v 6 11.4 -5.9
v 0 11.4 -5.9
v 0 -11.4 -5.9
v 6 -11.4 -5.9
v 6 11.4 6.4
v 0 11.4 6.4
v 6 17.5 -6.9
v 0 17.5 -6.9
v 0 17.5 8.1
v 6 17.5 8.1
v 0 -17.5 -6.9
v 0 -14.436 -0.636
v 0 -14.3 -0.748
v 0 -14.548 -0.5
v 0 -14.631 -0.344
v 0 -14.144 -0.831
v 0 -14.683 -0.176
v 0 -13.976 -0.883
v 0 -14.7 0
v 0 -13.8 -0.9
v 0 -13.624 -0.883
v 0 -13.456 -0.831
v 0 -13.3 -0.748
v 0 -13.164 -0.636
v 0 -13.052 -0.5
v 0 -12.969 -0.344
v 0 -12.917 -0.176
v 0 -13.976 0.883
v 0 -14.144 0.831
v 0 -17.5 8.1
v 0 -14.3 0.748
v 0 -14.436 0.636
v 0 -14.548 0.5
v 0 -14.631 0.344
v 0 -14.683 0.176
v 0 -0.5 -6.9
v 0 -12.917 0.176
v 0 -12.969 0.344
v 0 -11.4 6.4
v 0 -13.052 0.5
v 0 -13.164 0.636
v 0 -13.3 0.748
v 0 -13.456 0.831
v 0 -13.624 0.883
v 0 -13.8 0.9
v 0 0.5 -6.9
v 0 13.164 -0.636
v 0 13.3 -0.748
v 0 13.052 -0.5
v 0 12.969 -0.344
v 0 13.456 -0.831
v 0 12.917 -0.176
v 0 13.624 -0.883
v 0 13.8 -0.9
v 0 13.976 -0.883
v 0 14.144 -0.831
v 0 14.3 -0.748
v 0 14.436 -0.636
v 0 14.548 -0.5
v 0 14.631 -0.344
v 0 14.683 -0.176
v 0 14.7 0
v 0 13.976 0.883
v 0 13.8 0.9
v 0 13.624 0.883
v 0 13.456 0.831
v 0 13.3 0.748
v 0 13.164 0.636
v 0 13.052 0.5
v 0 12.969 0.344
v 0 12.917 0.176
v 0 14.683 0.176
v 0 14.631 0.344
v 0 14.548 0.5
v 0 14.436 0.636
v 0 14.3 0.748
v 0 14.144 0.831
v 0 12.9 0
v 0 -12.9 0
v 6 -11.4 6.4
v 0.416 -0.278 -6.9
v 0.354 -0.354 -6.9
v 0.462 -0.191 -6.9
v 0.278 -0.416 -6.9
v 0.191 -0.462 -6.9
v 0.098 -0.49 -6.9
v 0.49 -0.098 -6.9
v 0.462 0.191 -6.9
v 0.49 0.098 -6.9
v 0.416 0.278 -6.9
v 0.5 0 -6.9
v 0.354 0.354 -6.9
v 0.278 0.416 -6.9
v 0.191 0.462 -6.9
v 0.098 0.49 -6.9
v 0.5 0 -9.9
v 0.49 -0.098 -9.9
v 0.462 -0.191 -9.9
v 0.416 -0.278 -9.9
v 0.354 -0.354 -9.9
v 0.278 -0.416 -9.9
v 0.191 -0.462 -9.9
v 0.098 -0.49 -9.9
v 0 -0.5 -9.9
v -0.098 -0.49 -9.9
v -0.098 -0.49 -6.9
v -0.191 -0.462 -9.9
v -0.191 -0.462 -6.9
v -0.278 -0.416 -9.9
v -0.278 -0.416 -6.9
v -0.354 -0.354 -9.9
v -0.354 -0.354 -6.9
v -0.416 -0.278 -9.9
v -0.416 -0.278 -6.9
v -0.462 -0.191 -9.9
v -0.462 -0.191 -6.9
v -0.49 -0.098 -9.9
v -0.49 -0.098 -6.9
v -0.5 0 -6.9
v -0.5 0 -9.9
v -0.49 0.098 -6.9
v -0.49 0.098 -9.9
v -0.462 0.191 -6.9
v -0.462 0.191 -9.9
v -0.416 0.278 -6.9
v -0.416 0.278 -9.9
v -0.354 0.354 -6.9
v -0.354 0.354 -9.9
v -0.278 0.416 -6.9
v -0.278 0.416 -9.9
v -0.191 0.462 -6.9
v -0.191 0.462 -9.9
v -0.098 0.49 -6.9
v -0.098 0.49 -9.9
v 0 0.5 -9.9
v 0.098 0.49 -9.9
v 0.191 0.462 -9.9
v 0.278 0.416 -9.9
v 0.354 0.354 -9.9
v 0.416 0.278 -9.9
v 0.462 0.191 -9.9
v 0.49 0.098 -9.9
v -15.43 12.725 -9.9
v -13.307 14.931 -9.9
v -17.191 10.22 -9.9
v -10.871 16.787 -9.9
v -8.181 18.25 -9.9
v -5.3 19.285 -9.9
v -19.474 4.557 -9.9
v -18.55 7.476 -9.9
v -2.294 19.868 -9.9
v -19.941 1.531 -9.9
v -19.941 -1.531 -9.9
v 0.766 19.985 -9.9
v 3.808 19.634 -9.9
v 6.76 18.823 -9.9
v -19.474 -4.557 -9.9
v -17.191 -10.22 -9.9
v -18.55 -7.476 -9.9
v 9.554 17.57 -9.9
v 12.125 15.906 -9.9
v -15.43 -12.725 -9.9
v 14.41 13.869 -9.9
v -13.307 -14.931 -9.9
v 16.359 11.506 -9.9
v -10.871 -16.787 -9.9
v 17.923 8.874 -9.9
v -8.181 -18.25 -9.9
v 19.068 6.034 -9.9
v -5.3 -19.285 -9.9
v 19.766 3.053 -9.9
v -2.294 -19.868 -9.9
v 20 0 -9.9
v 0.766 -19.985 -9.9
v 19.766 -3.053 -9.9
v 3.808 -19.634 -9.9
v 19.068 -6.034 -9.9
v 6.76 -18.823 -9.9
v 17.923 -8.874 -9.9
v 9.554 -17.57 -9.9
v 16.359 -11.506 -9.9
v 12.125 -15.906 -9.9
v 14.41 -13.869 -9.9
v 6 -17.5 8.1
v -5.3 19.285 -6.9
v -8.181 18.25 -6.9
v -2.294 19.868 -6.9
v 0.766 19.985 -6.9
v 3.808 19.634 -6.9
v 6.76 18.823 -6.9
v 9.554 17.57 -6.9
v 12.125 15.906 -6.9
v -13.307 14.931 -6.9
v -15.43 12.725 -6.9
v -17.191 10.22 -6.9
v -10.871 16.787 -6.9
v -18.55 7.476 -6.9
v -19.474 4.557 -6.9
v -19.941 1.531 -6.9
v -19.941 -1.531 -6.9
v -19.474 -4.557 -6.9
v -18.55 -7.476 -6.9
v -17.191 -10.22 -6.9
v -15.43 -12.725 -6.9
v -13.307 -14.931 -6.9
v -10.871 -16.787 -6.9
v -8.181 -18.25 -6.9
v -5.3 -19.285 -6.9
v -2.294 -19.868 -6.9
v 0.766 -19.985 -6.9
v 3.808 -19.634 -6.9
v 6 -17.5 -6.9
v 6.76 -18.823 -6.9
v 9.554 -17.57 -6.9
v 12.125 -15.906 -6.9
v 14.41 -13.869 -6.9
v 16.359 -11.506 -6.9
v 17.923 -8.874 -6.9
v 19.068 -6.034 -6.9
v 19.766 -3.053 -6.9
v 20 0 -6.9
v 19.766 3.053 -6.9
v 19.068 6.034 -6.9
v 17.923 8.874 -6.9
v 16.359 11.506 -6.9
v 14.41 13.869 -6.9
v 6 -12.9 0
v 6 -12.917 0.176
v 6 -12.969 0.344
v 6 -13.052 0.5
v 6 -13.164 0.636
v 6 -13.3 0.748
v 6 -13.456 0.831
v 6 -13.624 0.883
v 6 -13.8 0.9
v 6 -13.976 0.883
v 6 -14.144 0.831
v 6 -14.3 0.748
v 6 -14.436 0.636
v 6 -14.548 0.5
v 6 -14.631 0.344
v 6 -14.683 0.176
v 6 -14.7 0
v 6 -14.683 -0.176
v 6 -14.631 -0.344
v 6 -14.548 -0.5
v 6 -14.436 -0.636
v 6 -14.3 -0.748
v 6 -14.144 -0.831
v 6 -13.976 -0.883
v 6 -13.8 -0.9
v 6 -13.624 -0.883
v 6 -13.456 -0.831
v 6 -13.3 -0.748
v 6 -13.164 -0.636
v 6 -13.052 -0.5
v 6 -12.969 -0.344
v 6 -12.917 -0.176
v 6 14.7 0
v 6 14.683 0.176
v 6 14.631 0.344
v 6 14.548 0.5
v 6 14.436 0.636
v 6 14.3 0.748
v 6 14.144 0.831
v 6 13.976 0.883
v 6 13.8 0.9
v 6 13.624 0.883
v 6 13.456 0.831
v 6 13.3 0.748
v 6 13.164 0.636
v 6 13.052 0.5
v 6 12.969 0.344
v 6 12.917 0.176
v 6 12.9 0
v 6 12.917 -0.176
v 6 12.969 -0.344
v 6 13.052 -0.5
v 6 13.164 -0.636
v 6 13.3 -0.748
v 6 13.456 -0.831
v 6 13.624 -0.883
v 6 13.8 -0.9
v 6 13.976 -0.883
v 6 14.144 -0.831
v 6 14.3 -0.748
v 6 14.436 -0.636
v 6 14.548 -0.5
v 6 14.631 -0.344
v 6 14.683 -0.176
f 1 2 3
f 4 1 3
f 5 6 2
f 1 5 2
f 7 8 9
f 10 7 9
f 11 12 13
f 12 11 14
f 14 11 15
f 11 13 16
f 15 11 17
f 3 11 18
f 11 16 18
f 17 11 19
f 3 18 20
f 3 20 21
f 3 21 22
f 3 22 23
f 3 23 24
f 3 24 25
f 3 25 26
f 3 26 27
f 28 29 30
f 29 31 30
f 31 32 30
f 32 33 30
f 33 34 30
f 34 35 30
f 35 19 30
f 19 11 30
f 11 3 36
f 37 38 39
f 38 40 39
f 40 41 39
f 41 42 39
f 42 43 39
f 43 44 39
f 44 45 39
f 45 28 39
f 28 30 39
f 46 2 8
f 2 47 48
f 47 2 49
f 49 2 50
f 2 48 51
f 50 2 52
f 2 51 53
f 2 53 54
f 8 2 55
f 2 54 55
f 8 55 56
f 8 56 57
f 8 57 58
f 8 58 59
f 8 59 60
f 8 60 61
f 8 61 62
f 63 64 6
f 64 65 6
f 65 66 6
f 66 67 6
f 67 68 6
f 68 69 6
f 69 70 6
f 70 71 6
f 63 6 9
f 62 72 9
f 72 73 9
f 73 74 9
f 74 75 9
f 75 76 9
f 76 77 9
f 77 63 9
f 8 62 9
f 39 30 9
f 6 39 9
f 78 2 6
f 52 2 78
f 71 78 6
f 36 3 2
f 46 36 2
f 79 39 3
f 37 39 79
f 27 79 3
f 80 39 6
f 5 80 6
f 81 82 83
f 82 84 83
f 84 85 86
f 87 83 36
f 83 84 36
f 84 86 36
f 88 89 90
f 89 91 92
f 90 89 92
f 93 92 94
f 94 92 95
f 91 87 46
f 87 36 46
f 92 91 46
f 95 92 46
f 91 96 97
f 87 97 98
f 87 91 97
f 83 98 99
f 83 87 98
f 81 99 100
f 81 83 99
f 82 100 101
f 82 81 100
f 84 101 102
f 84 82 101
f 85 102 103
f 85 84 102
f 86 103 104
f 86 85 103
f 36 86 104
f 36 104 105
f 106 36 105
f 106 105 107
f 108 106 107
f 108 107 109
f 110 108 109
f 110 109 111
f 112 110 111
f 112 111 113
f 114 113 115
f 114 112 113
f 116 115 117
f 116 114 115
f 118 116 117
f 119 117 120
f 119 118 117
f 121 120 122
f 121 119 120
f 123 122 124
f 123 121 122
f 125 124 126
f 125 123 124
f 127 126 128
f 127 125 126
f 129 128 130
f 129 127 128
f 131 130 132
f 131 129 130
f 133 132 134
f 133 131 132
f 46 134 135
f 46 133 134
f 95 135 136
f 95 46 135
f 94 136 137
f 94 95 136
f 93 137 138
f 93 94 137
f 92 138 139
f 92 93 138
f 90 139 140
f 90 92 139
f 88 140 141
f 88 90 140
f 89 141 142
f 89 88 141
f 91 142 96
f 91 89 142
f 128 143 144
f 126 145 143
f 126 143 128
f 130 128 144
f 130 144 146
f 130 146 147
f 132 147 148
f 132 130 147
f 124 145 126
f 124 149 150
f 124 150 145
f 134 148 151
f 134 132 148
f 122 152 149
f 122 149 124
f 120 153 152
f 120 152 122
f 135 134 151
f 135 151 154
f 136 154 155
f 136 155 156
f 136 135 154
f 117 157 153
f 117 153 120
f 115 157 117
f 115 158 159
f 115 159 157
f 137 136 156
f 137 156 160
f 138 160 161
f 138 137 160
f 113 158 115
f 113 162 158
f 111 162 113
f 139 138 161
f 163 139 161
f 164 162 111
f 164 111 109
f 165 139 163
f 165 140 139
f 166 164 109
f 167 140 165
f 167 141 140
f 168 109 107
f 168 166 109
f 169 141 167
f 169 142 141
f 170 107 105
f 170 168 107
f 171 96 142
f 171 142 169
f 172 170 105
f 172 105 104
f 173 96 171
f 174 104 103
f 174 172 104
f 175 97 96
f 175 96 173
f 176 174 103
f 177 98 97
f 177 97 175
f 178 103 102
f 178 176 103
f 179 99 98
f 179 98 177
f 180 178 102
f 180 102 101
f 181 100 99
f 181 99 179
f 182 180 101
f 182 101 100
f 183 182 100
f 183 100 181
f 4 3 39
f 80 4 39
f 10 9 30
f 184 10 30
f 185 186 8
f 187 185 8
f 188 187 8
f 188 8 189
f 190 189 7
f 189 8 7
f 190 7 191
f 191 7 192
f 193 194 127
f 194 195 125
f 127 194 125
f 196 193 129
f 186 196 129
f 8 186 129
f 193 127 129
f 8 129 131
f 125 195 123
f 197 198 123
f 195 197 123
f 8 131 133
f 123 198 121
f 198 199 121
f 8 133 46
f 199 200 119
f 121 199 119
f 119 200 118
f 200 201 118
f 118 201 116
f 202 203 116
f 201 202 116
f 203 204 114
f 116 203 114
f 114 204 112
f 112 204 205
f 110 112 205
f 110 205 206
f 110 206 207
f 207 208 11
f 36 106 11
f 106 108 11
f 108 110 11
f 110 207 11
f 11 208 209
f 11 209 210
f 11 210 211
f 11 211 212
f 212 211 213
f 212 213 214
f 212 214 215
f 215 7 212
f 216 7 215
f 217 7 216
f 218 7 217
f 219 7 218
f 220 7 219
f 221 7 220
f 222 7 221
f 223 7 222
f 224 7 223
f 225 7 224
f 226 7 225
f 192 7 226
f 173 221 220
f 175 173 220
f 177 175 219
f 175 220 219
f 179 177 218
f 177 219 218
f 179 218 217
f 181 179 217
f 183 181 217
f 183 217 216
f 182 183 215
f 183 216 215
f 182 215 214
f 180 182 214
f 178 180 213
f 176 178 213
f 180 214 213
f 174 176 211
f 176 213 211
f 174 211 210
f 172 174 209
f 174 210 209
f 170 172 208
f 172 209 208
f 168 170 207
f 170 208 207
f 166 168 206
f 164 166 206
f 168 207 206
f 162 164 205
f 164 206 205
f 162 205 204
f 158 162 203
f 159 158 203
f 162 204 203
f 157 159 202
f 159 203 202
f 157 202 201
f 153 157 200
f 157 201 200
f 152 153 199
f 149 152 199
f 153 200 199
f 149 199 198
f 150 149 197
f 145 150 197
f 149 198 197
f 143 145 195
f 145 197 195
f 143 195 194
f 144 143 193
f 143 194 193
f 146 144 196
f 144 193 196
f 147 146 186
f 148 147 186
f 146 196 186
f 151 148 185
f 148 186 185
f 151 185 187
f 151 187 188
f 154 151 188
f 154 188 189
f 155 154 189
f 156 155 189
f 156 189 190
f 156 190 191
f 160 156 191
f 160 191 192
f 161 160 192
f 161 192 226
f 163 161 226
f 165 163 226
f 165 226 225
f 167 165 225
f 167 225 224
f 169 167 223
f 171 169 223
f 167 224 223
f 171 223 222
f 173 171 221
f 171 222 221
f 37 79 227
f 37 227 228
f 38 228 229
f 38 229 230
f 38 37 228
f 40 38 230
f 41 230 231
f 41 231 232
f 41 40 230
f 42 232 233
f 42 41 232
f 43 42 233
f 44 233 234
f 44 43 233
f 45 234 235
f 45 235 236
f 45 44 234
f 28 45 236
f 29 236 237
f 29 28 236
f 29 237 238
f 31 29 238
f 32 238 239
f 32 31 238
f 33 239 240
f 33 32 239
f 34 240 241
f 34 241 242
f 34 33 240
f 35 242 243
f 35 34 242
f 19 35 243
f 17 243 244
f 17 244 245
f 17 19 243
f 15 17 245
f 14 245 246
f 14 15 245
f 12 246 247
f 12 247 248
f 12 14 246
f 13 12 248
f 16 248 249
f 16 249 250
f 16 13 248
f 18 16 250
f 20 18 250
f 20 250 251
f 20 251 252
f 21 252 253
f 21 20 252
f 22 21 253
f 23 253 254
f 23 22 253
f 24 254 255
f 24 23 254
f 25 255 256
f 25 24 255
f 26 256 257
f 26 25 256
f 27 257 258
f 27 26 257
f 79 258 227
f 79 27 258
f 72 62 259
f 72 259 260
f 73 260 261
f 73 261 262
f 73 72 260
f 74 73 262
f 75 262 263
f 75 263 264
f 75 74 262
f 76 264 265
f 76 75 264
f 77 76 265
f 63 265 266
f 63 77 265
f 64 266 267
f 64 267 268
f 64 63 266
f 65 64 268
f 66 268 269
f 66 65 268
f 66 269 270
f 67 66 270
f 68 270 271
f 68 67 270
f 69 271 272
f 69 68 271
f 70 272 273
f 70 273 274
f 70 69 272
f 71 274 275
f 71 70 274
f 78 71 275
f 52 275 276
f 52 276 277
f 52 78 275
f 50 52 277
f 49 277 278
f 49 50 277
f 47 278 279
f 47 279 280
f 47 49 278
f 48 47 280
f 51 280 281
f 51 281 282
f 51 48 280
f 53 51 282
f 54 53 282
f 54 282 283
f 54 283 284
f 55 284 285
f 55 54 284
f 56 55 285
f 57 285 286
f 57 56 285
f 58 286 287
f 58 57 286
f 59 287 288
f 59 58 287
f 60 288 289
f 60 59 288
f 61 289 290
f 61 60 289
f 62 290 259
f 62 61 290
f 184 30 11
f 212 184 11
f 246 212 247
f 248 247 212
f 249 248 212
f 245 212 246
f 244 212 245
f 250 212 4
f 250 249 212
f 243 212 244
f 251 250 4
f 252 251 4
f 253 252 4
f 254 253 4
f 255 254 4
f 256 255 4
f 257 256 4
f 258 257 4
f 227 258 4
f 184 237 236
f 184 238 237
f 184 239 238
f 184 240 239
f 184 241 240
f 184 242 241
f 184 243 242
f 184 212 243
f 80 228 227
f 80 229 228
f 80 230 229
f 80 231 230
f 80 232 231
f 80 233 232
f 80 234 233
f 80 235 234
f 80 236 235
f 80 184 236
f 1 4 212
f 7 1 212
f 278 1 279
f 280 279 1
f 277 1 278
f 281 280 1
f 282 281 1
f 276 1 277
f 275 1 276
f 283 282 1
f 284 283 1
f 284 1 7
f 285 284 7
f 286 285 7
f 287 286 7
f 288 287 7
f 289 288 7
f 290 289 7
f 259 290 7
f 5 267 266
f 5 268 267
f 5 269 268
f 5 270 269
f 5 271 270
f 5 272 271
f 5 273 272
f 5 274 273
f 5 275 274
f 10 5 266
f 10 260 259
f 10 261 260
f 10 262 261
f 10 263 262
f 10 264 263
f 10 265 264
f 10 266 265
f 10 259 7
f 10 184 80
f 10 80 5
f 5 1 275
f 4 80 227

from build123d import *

# Parameters (mm, degrees)
F0_R     = 0.9
F1_DEPTH = 6
F2_R     = 20
F2_R_2   = 0.5
F3_DEPTH = 3


with BuildPart() as f1:
    # F0 (on Right) → F1 (new body)
    with BuildSketch(Plane.YZ):
        Polygon((17.5, -6.9), (17.5, 5.6), (17.5, 6.9), (17.5, 8.1), (-17.5, 8.1), (-17.5, 6.9), (-17.5, -6.9), align=None)
        with Locations((-13.8, 0)):
            Circle(F0_R, mode=Mode.SUBTRACT)
        Polygon((11.4, 6.4), (11.4, 5.9), (11.4, -5.9), (-11.4, -5.9), (-11.4, 5.9), (-11.4, 6.4), align=None, mode=Mode.SUBTRACT)
        with Locations((13.8, 0)):
            Circle(F0_R, mode=Mode.SUBTRACT)
    extrude(amount=F1_DEPTH)

    # F2 (on face) → F3 (join)
    with BuildSketch(Plane(origin=(0, 0, -6.9), x_dir=(1, 0, 0), z_dir=(0, 0, -1))):
        Circle(F2_R)
        Circle(F2_R_2, mode=Mode.SUBTRACT)
    extrude(amount=F3_DEPTH)


solid = f1.part
